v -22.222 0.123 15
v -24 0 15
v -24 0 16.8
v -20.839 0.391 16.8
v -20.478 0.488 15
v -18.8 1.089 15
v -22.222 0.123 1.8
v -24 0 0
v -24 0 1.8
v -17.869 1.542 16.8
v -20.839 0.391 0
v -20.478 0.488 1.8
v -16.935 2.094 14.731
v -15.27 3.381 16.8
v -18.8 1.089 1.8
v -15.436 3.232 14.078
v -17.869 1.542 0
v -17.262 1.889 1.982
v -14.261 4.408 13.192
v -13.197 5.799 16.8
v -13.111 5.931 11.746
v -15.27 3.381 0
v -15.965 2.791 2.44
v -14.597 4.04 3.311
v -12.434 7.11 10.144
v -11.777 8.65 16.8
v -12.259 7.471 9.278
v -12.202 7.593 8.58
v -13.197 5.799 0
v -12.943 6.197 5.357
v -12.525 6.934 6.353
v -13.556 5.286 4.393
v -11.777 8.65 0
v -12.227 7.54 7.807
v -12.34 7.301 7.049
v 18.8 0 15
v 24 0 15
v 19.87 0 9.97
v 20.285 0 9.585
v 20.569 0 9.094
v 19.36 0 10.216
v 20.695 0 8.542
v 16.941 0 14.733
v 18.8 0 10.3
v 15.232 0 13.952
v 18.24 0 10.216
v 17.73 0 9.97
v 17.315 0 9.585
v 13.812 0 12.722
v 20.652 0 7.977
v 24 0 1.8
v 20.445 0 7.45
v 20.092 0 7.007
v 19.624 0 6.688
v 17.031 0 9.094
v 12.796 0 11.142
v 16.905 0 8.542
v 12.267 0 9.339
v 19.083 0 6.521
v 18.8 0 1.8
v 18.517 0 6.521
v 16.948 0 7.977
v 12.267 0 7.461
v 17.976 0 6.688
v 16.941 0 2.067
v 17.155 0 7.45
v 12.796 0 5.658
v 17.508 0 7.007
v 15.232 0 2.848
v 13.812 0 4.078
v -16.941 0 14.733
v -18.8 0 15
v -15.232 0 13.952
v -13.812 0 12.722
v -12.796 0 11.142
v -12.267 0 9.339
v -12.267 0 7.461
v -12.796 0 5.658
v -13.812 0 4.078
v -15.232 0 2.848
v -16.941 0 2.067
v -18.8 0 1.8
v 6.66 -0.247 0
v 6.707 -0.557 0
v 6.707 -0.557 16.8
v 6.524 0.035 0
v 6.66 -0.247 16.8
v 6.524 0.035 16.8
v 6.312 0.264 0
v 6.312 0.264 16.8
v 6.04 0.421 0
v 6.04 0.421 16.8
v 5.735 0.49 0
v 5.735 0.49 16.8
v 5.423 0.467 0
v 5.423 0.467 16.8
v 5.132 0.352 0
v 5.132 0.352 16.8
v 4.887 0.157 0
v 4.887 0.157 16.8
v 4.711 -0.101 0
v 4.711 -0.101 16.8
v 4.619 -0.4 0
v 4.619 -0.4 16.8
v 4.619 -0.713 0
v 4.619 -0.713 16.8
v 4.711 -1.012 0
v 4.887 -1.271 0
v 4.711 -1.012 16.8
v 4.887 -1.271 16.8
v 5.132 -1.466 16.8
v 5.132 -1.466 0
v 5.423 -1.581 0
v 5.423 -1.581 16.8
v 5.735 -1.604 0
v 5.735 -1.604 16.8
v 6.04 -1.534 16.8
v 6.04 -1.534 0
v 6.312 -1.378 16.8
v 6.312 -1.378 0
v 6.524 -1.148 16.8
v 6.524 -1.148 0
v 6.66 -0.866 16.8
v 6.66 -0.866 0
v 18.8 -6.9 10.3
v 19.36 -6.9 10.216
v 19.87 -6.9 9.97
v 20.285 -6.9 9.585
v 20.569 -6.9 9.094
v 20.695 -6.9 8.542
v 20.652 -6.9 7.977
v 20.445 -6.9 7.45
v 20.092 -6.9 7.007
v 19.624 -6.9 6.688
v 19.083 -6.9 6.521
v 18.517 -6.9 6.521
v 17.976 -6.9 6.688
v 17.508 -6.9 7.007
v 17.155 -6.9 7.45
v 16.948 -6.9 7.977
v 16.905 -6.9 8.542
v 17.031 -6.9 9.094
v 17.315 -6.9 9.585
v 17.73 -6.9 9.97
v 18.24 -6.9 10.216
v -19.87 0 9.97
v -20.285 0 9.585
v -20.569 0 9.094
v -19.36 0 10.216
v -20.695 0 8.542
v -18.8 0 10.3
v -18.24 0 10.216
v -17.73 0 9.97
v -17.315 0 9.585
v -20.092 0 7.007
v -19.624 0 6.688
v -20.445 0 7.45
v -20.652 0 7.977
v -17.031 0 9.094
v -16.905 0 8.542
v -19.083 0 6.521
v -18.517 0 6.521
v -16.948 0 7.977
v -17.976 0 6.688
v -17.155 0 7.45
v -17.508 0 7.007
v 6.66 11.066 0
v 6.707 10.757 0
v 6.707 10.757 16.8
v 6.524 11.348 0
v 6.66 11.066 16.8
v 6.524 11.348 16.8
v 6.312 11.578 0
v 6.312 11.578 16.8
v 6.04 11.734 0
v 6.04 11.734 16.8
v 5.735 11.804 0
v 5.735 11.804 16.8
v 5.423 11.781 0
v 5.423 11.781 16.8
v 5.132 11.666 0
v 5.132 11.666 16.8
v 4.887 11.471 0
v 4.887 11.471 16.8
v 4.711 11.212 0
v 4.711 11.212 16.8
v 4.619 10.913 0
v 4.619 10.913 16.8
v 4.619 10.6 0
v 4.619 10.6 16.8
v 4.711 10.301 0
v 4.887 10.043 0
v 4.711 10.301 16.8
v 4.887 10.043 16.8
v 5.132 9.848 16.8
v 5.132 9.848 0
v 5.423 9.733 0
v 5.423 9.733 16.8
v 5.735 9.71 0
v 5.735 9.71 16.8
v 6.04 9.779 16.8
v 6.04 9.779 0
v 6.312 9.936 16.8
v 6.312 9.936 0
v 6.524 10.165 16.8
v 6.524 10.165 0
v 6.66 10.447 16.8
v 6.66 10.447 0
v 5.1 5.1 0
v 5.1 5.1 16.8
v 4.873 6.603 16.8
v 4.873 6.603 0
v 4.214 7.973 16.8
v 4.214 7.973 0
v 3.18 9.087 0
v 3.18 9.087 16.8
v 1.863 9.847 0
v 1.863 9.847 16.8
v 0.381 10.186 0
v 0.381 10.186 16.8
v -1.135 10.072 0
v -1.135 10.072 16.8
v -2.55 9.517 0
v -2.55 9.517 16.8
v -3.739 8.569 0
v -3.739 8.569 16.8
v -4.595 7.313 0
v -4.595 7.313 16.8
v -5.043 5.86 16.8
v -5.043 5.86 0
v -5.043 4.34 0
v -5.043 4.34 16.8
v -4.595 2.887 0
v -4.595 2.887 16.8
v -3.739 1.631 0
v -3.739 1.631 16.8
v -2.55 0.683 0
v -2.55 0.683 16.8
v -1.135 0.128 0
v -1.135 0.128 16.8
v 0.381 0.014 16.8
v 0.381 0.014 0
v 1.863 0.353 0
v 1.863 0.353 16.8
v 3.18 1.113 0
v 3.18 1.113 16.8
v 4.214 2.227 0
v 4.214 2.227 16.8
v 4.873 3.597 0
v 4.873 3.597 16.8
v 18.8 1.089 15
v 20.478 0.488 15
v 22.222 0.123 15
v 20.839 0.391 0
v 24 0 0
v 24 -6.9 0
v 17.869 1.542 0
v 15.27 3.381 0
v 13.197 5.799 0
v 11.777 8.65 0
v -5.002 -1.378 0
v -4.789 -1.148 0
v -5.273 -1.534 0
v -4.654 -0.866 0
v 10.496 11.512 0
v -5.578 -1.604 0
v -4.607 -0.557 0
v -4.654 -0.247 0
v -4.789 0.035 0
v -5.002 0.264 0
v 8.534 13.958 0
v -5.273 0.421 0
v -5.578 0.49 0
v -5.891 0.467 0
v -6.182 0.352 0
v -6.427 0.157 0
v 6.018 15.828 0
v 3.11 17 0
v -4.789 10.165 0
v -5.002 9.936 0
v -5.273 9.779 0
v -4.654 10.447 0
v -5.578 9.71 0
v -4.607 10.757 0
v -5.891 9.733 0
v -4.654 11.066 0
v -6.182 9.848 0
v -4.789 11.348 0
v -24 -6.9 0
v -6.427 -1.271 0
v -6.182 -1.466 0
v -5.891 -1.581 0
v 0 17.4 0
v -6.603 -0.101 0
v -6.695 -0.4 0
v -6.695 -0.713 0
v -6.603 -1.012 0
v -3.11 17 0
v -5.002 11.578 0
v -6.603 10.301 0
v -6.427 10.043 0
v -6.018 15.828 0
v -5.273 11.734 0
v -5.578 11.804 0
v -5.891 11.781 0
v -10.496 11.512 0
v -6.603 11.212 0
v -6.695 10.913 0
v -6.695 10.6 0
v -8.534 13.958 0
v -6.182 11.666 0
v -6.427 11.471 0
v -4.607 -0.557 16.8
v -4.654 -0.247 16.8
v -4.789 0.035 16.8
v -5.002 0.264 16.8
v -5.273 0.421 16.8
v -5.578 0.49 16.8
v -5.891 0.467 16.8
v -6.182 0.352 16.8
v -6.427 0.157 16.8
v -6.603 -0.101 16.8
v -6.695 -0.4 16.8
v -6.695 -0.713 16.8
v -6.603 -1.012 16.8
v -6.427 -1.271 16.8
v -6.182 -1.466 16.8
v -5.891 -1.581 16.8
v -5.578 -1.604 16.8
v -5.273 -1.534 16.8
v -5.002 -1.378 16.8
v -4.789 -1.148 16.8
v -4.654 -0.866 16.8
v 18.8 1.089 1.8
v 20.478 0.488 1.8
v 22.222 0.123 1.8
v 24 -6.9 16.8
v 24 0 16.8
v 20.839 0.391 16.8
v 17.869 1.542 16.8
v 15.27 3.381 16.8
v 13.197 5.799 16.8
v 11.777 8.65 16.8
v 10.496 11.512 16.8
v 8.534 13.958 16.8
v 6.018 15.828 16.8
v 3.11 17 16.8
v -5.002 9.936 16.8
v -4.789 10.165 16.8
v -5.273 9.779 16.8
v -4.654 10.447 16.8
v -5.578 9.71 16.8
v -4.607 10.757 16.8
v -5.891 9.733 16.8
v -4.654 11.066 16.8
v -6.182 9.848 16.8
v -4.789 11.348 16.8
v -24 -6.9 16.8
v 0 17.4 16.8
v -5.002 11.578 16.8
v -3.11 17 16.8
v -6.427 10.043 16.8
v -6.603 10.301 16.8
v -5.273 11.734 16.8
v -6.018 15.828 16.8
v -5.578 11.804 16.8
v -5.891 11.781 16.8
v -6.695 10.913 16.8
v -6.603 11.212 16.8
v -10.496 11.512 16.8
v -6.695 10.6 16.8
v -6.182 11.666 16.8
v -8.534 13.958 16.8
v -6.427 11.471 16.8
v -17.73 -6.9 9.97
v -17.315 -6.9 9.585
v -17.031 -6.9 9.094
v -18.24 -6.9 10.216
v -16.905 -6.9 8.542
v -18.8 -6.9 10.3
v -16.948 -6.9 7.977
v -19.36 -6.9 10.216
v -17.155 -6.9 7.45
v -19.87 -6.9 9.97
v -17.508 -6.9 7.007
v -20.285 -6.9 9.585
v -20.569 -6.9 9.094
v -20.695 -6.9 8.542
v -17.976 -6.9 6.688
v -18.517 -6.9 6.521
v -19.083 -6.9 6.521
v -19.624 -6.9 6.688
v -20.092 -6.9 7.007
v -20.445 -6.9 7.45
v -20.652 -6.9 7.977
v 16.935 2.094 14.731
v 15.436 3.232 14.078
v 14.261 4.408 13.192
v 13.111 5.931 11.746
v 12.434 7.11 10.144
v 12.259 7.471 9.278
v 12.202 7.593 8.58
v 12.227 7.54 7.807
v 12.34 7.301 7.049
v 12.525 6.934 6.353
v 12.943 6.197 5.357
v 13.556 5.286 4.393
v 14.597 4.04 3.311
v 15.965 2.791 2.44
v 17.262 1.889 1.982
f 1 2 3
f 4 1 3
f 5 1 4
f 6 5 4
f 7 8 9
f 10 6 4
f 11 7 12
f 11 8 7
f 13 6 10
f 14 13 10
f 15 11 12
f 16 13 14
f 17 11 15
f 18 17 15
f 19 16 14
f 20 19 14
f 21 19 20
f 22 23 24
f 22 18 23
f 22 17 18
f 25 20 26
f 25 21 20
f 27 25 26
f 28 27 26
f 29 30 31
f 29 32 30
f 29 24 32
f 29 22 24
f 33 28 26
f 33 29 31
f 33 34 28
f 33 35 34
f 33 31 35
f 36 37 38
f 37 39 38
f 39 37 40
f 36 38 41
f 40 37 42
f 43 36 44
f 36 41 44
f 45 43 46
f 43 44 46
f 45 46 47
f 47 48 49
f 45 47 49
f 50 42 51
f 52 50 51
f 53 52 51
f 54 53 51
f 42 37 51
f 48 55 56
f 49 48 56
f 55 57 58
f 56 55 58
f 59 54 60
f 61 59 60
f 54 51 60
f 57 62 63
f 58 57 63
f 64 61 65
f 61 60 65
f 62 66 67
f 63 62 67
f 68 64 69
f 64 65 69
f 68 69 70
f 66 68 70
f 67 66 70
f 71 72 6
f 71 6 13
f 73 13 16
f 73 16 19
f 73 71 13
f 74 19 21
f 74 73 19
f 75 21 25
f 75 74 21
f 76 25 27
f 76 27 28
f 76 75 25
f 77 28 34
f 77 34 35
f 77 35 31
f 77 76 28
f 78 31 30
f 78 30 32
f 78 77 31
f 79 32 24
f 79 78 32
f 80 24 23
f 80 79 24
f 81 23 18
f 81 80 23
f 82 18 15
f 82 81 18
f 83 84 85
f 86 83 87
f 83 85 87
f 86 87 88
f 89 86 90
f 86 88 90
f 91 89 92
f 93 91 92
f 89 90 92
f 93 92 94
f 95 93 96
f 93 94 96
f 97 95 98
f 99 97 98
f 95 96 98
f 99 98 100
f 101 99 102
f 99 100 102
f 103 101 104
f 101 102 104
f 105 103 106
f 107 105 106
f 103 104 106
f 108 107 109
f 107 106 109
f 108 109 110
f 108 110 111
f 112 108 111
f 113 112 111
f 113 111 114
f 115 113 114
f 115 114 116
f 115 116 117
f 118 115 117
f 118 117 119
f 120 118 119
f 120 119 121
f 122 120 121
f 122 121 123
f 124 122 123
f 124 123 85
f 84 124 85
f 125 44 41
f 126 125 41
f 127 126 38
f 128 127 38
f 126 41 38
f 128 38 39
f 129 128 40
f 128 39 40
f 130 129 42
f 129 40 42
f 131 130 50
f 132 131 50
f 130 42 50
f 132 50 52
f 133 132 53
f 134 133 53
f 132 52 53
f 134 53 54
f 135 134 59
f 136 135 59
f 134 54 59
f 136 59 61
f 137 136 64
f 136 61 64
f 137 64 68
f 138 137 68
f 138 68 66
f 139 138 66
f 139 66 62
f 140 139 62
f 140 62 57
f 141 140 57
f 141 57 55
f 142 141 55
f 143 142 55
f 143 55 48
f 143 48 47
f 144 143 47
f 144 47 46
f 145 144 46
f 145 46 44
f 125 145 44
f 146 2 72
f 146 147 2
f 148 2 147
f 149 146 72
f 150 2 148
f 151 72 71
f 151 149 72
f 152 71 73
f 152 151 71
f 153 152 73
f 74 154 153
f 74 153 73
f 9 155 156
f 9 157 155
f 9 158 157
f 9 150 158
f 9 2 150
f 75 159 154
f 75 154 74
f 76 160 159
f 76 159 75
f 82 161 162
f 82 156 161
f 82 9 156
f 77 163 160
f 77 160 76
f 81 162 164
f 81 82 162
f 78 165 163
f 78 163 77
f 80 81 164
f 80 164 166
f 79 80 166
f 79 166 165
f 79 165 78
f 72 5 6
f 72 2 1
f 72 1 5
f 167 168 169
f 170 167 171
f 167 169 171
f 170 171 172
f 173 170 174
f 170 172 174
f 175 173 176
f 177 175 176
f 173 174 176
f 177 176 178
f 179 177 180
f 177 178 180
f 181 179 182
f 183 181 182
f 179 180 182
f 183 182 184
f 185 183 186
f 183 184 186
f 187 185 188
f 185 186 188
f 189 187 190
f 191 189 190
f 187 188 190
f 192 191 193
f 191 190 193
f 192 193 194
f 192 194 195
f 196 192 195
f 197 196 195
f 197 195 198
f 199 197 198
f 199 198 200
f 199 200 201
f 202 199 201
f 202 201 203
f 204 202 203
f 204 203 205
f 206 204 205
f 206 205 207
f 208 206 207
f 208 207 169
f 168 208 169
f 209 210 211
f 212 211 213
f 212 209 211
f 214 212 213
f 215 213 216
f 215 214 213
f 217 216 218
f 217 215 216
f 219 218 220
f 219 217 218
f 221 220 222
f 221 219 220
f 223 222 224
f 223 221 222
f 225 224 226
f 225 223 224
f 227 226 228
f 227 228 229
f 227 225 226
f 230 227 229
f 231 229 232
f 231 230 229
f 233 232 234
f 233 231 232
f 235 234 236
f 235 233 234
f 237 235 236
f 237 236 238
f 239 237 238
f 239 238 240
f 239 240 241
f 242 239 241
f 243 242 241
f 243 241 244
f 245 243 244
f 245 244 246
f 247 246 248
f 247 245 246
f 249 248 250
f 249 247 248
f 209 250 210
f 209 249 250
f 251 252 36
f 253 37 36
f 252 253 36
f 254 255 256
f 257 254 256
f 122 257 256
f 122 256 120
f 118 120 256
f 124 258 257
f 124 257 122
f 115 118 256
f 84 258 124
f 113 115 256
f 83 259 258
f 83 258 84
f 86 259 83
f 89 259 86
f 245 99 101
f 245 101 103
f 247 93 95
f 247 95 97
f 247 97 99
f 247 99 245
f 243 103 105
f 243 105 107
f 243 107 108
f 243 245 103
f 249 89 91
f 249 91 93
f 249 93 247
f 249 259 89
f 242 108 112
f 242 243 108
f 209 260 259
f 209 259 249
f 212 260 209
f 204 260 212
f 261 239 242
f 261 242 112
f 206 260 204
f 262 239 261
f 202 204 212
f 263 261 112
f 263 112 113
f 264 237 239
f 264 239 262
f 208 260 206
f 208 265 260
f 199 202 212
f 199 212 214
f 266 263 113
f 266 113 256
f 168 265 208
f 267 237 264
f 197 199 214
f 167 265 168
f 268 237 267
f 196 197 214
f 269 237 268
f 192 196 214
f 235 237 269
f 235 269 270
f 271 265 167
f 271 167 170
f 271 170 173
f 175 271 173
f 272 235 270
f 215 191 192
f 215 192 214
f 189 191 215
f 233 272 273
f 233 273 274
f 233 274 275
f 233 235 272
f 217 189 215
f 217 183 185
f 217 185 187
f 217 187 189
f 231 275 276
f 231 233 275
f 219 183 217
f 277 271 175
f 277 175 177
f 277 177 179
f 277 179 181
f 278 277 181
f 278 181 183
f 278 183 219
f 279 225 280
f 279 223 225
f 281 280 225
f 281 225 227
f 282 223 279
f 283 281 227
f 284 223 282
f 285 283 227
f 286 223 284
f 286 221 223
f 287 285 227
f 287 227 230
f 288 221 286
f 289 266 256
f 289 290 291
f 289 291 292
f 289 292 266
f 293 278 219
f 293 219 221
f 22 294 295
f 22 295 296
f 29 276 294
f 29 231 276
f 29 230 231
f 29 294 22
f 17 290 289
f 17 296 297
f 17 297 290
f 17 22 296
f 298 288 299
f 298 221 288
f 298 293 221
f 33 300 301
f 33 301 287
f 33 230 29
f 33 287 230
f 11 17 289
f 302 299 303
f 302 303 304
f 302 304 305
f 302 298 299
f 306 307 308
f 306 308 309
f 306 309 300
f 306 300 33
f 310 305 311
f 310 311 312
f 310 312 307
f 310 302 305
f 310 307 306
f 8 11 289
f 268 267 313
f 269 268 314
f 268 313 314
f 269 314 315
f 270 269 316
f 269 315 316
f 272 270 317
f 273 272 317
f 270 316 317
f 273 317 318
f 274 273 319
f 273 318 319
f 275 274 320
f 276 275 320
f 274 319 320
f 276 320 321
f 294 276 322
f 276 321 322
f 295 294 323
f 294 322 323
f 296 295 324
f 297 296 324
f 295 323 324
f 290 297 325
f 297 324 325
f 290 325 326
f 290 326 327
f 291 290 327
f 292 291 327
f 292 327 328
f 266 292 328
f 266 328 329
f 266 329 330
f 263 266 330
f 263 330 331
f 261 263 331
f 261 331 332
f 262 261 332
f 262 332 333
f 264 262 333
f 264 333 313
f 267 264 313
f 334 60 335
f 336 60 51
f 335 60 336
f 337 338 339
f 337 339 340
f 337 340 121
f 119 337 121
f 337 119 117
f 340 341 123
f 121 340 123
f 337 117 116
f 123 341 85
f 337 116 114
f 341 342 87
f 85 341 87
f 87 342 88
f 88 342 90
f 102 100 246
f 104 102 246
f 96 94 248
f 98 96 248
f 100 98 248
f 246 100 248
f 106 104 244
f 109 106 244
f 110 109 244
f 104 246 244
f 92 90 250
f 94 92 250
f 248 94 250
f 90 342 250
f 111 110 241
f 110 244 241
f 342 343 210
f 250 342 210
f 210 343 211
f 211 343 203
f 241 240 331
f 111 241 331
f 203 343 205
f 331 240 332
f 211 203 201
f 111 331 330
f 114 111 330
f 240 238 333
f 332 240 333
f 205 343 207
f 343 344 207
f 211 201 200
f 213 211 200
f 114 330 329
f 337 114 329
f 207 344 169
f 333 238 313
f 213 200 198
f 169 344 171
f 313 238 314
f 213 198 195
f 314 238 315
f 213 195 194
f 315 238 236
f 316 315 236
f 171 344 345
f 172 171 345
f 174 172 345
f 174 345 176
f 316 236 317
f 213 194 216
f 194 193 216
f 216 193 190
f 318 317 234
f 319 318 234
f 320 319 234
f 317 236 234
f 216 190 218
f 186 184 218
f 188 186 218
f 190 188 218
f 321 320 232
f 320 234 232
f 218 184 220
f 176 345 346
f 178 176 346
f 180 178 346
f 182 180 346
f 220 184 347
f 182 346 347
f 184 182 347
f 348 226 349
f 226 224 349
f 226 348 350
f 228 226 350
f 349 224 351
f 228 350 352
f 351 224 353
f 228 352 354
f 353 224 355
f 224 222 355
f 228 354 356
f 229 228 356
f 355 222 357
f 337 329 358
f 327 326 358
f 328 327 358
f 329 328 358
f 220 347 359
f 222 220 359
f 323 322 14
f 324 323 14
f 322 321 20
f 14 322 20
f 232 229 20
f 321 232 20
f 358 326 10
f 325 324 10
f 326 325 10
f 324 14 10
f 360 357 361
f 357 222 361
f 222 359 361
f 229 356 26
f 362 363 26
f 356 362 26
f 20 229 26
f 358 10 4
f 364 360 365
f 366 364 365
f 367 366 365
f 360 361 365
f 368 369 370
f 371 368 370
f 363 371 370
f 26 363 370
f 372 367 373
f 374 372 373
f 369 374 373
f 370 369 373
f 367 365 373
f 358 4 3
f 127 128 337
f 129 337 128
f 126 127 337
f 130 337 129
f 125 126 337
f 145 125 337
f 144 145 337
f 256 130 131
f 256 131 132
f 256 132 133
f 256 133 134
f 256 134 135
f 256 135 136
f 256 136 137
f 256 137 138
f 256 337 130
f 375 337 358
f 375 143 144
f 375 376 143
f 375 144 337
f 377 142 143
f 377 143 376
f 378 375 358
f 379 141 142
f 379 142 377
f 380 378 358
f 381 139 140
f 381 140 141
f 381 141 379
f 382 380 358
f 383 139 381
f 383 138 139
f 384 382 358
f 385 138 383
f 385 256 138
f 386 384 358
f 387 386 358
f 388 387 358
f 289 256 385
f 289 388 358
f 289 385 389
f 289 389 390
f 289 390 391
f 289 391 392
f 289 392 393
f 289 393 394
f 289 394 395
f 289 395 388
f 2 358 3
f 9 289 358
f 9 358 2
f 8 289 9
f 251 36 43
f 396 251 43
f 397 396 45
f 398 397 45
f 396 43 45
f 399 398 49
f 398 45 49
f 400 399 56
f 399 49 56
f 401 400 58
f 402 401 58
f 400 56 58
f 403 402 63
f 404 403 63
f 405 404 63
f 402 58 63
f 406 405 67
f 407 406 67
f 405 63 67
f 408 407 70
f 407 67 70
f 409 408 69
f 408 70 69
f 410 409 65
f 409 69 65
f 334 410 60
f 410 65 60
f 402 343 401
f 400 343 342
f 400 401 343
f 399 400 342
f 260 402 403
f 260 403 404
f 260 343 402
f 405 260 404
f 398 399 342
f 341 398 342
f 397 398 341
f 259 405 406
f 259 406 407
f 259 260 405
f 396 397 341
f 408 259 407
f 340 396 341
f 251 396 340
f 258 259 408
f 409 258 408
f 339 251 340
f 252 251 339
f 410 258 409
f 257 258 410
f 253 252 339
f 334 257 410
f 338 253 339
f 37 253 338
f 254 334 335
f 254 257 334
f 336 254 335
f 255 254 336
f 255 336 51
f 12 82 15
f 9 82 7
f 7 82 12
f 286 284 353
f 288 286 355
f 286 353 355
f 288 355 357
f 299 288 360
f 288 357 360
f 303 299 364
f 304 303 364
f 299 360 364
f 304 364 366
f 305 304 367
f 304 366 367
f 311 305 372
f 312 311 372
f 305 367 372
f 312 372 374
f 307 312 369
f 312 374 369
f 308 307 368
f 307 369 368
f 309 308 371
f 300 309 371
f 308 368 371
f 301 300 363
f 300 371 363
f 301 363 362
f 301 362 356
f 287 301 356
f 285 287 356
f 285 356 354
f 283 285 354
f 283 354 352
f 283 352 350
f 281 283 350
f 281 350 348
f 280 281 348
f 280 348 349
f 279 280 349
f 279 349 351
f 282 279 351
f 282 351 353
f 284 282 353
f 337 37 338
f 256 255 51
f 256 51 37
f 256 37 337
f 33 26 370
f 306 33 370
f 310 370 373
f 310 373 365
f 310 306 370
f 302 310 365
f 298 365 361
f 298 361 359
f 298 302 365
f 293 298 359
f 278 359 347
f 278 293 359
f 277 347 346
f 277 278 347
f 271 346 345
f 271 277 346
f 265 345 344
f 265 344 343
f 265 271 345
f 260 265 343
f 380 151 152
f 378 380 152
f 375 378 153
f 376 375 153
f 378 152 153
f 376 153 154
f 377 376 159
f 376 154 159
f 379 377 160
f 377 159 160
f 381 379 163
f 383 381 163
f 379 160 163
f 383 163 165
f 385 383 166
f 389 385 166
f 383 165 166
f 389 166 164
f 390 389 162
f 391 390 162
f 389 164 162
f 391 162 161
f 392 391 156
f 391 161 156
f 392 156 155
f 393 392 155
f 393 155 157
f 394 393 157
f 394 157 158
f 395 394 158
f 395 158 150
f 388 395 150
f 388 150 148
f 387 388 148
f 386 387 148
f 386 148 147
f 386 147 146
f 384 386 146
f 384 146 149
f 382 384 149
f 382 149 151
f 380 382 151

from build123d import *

# Parameters (mm, degrees)
CROQUIS2_R              = 5.1
SALIENTE_EXTRUIR1_DEPTH = 16.8
CROQUIS3_R              = 1.05
CORTAR_EXTRUIR1_DEPTH   = 35.073450075
CORTAR_EXTRUIR2_DEPTH   = 35.073450075
CROQUIS5_R              = 1.9
CORTAR_EXTRUIR3_DEPTH   = 35.073450195


with BuildPart() as part:
    # Croquis2 → Saliente-Extruir1 (new body)
    with BuildSketch(Plane.XY):
        with BuildLine():
            Line((24, 0), (24, -6.9))
            Line((24, -6.9), (-24, -6.9))
            Line((-24, -6.9), (-24, 0))
            ThreePointArc((-24, 0), (-16.512763431, 2.381234531), (-11.776565713, 8.65))
            ThreePointArc((-11.776565713, 8.65), (0, 17.4), (11.776565713, 8.65))
            ThreePointArc((11.776565713, 8.65), (16.512763431, 2.381234531), (24, 0))
        make_face()
        with Locations((0, 5.1)):
            Circle(CROQUIS2_R, mode=Mode.SUBTRACT)
    extrude(amount=SALIENTE_EXTRUIR1_DEPTH)

    # Croquis3 → Cortar-Extruir1 (cut, through all)
    with BuildSketch(Plane.XY.offset(16.8)):
        with Locations((5.656854249, 10.756854249)):
            Circle(CROQUIS3_R)
        with Locations((5.656854249, -0.556854249)):
            Circle(CROQUIS3_R)
        with Locations((-5.656854249, -0.556854249)):
            Circle(CROQUIS3_R)
        with Locations((-5.656854249, 10.756854249)):
            Circle(CROQUIS3_R)
    extrude(amount=-CORTAR_EXTRUIR1_DEPTH, mode=Mode.SUBTRACT)

    # Croquis4 → Cortar-Extruir2 (cut, through all)
    with BuildSketch(Plane(origin=(0, 0, 0), x_dir=(1, 0, 0), z_dir=(0, 1, 0))):
        with BuildLine():
            Line((-24, -1.8), (-24, -15))
            Line((-24, -15), (-18.8, -15))
            ThreePointArc((-18.8, -15), (-12.2, -8.4), (-18.8, -1.8))
            Line((-18.8, -1.8), (-24, -1.8))
        make_face()
        with BuildLine():
            Line((24, -15), (18.8, -15))
            ThreePointArc((18.8, -15), (12.2, -8.4), (18.8, -1.8))
            Line((18.8, -1.8), (24, -1.8))
            Line((24, -1.8), (24, -15))
        make_face()
    extrude(amount=CORTAR_EXTRUIR2_DEPTH, mode=Mode.SUBTRACT)

    # Croquis5 → Cortar-Extruir3 (cut, through all)
    with BuildSketch(Plane(origin=(0, 0, 0), x_dir=(1, 0, 0), z_dir=(0, 1, 0))):
        with Locations(Location((-18.8, -8.4, 0), (0, 0, 270))):
            Circle(CROQUIS5_R)
        with Locations(Location((18.8, -8.4, 0), (0, 0, 270))):
            Circle(CROQUIS5_R)
    extrude(amount=-CORTAR_EXTRUIR3_DEPTH, mode=Mode.SUBTRACT)


solid = part.part
